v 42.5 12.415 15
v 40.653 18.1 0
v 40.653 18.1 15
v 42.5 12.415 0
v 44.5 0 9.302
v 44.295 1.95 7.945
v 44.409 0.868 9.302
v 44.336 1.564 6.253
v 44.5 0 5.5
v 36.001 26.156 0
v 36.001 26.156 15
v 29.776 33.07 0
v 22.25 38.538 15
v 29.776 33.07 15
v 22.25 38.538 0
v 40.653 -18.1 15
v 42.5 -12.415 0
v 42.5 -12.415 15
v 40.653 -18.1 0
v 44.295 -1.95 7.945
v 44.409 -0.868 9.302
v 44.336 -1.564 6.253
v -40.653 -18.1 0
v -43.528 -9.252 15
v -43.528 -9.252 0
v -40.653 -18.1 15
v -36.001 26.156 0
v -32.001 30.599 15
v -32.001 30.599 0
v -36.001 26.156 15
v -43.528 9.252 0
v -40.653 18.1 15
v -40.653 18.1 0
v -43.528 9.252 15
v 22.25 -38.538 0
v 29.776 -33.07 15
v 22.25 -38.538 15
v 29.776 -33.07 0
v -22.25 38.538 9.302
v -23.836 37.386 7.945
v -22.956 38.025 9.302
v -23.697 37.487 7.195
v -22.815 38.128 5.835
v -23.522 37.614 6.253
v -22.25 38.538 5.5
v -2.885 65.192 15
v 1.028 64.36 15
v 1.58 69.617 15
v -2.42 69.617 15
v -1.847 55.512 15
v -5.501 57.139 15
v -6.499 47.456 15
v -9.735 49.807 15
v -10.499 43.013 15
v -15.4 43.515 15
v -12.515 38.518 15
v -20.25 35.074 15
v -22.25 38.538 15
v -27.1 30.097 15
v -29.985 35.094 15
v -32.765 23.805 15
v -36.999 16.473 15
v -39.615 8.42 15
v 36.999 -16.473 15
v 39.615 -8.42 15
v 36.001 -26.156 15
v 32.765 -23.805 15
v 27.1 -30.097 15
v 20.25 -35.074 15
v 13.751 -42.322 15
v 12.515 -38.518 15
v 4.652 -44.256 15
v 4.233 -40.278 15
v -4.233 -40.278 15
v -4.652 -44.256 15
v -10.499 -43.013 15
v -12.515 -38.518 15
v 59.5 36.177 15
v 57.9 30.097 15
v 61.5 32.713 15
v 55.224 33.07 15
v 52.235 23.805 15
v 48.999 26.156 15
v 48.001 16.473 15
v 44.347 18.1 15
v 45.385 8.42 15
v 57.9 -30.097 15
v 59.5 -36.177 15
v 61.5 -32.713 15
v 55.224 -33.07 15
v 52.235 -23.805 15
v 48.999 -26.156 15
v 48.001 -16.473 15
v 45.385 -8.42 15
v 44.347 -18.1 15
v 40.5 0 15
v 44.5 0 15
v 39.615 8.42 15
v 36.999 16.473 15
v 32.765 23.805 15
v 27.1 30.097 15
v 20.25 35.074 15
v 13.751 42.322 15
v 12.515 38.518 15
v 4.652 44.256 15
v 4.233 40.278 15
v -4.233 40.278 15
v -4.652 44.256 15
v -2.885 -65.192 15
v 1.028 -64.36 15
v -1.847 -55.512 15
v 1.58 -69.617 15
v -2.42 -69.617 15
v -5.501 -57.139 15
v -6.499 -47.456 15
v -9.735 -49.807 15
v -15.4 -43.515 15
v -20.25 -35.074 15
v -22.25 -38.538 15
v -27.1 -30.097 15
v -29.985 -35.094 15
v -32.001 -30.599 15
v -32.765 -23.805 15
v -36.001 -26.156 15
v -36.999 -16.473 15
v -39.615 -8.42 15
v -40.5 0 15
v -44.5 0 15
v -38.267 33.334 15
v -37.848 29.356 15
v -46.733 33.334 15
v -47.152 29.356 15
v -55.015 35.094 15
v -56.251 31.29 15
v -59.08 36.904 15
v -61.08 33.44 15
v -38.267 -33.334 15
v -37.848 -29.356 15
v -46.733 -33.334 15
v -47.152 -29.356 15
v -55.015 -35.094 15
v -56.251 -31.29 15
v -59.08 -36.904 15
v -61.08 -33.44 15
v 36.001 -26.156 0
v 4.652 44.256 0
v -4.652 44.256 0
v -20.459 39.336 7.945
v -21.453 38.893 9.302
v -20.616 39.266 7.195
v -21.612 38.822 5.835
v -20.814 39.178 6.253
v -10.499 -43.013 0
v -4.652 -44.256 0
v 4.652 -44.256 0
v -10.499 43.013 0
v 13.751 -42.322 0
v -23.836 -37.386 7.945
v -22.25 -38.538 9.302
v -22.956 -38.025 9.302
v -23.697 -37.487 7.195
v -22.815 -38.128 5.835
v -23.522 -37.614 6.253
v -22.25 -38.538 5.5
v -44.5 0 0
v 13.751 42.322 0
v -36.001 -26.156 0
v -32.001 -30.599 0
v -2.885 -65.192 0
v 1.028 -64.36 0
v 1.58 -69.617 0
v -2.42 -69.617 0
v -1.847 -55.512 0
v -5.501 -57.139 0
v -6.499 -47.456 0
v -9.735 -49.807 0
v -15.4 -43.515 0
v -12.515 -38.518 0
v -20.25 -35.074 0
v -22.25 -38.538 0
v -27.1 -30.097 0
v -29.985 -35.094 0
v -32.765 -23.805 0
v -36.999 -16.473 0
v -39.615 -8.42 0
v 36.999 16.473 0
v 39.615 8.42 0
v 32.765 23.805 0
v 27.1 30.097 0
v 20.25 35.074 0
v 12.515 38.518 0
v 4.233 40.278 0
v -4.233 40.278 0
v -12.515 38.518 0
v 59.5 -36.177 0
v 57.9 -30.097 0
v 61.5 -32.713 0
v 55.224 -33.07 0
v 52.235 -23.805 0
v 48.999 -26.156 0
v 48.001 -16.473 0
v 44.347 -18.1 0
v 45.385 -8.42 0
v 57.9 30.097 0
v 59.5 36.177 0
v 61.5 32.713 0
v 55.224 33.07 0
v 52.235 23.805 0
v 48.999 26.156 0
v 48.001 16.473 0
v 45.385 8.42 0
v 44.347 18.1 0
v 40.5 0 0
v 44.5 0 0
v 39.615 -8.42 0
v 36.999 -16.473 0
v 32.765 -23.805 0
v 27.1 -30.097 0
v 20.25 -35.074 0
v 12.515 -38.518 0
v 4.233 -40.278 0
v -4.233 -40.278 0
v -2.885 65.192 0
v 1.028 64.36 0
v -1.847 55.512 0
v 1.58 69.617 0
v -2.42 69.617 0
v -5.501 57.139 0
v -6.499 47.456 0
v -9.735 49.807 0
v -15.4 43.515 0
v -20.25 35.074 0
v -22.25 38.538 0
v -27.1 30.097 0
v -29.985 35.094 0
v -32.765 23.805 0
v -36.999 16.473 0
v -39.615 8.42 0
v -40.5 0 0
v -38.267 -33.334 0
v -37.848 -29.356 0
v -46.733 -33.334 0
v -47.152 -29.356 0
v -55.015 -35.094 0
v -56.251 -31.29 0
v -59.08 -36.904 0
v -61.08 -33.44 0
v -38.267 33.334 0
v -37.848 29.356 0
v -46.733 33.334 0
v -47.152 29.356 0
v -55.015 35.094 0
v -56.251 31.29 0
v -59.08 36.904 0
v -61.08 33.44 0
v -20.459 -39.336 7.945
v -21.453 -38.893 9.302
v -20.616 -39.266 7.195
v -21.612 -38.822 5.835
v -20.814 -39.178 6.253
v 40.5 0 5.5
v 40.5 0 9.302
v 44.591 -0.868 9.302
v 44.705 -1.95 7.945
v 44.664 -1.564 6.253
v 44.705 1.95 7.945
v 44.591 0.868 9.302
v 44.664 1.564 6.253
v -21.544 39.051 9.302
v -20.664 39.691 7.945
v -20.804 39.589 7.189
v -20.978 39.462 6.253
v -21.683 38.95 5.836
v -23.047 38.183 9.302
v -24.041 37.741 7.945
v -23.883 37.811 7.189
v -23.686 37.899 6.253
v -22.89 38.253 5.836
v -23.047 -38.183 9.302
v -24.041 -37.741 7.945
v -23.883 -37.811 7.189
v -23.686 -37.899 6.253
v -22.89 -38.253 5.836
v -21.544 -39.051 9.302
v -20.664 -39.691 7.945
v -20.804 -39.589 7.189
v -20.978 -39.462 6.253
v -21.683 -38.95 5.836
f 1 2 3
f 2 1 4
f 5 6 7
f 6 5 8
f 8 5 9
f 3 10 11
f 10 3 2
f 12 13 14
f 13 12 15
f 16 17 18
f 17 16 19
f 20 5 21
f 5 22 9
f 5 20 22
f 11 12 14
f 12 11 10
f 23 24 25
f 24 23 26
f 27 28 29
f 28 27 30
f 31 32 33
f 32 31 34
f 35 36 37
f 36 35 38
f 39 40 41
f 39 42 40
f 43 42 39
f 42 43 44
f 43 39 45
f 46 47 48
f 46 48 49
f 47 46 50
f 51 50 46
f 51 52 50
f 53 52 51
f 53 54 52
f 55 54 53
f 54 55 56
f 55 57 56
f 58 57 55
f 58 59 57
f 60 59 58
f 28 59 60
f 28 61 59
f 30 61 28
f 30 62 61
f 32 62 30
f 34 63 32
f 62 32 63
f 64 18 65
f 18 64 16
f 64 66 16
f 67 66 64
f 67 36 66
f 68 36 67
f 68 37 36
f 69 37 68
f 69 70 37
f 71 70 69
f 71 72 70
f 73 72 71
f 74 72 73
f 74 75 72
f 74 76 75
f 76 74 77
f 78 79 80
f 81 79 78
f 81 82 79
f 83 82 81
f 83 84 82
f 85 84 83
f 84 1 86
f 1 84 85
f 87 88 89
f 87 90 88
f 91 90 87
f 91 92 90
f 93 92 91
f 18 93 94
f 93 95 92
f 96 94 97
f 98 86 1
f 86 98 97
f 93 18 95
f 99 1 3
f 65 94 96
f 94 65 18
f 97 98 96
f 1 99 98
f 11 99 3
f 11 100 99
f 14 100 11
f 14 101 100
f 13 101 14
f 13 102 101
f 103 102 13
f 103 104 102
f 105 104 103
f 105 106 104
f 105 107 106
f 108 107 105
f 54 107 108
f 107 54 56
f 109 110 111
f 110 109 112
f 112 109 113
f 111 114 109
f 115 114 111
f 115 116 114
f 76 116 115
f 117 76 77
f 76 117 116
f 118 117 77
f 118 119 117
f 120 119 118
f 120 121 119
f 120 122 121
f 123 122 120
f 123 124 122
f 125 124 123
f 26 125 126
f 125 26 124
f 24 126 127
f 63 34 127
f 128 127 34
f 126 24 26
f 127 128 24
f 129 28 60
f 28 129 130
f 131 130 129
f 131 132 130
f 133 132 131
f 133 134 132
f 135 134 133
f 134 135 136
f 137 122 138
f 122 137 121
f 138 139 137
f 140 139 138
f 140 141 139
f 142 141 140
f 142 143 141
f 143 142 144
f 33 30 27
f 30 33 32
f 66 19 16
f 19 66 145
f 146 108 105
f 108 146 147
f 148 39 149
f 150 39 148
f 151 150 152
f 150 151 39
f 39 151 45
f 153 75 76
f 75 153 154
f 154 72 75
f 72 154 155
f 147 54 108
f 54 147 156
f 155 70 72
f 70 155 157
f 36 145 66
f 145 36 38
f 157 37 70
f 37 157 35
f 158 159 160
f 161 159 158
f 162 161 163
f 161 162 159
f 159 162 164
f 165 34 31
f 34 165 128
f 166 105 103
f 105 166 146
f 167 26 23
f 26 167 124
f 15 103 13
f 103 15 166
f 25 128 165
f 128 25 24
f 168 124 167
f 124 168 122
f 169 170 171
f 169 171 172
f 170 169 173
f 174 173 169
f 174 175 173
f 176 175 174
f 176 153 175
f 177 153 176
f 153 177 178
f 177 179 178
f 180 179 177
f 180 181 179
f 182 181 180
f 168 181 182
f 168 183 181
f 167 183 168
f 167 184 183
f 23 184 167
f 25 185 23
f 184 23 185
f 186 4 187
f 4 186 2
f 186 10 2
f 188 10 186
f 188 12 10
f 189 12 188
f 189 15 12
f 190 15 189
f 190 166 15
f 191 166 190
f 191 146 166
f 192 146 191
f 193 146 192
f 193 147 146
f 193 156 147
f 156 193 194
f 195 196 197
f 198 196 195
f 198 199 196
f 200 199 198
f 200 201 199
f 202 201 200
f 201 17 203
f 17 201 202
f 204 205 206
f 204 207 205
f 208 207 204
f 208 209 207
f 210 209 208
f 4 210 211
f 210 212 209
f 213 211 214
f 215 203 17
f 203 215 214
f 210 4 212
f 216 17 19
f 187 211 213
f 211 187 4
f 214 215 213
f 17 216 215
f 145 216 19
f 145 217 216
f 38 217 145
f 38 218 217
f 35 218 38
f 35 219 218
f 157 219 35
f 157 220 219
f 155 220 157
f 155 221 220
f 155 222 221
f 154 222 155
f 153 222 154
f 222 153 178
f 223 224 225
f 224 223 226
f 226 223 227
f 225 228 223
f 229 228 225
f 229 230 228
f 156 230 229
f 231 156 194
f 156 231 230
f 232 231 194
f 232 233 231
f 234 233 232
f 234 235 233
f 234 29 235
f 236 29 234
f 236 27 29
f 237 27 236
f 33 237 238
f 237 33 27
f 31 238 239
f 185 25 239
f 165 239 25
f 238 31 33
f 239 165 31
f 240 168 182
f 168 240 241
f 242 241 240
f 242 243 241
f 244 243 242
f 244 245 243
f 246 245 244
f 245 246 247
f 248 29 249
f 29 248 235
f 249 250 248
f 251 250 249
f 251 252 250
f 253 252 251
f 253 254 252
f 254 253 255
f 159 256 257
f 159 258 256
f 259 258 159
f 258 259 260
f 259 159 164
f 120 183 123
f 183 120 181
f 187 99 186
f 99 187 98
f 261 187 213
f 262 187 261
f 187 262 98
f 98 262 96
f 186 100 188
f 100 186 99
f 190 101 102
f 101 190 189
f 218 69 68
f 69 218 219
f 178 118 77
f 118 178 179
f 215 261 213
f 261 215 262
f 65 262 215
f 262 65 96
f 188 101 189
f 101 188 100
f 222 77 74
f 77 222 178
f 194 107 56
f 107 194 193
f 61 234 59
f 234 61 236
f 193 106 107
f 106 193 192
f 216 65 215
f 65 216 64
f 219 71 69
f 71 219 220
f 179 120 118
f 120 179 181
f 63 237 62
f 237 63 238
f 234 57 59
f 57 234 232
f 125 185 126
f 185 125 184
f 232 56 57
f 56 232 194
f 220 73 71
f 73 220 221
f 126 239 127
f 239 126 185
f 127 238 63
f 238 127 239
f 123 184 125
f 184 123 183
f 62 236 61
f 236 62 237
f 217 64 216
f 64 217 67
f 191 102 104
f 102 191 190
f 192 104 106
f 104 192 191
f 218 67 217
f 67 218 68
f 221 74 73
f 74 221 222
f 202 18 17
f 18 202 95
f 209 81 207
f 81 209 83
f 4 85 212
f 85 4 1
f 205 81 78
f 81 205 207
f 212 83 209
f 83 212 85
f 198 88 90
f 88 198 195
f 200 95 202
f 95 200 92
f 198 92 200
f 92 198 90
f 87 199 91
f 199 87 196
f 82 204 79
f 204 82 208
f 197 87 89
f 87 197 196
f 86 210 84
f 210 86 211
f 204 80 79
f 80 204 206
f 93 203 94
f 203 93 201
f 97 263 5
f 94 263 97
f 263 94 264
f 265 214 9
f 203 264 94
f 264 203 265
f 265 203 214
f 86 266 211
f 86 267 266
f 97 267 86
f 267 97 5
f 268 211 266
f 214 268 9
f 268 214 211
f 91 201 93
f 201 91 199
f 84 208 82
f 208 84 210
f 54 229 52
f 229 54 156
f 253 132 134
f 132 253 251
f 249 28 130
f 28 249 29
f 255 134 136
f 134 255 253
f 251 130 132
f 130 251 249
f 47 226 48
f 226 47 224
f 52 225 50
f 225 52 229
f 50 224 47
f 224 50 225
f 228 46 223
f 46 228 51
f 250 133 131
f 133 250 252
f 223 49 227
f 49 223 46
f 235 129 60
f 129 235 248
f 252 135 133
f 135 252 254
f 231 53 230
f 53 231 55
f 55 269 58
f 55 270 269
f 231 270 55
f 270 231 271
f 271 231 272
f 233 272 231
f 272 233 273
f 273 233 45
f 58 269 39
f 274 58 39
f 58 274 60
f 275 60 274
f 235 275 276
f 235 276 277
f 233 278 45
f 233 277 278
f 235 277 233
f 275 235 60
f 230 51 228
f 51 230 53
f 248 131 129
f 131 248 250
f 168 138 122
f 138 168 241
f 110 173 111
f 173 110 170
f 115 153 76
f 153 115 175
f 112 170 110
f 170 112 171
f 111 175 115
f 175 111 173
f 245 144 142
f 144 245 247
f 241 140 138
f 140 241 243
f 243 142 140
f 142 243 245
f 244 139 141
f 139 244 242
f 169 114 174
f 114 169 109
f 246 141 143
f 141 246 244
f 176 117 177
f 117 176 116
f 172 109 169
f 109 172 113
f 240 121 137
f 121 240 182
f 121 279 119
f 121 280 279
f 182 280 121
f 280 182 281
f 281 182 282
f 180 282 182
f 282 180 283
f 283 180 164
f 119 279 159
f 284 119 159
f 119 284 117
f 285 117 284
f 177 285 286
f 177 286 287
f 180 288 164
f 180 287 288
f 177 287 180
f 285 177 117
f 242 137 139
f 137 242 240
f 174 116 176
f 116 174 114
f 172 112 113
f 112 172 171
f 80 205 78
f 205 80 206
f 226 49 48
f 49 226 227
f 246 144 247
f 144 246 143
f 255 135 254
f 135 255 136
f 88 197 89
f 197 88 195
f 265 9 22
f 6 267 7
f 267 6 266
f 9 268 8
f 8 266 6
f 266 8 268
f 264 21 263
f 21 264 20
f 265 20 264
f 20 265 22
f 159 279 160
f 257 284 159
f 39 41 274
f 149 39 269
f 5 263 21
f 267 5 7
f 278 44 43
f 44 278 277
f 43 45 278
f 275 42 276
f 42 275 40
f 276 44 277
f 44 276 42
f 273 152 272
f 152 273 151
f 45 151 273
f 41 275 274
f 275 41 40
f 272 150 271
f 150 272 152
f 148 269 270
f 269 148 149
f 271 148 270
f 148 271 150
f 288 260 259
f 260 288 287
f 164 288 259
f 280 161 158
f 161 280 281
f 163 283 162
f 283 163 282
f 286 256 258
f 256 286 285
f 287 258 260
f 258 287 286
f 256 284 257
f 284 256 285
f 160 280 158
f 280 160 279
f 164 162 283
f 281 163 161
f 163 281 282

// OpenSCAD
ring_diameter = 89;
ring_thickness = 4;
ring_height = 15;

module ring(diameter, thickness, height) {
  outer_radius = diameter / 2;
  inner_radius = outer_radius - thickness;
  difference() {
    // outer cylinder
    cylinder(height, outer_radius, outer_radius, false);
    // inner cylinder, which gets subtracted from the outer in order to
    // make a ring
    translate([0,0,-1]) {
      cylinder(17, inner_radius, inner_radius, false);
    };
  };
};

module offset_ring(diameter, thickness, height) {
  translate([diameter - thickness, 0, 0]) {
    ring(diameter, thickness, height);
  };
}

module screw_hole() {
  // one cylinder emanating from the z-axis that will be subtracted
  // from a ring to create a hole for a nut and bolt
  translate([0,0, ring_height/2]) {
    rotate([0,90,0]) {
      cylinder(100, 2, 2, false);
    };
  };
};

module basic_inner_hub() {
  // center ring
  ring(ring_diameter, ring_thickness, ring_height);

  difference() {
    intersection() {

      union() {
        // three rings around the outside of the center ring
        offset_ring(ring_diameter, ring_thickness, ring_height);
        rotate([0,0,120]) {
          offset_ring(ring_diameter, ring_thickness, ring_height);
        };
        rotate([0,0,240]) {
          offset_ring(ring_diameter, ring_thickness, ring_height);
        };
      };

      // bounding cylinder to cut off everything but the innermost
      // arcs of the rings around the outside
      cylinder(20, 70, 70, false);
    };

    // screw holes
    union() {
      screw_hole();
      rotate([0,0,120]) {
        screw_hole();
      };
      rotate([0,0,240]) {
        screw_hole();
      };
    };
  };
};

basic_inner_hub();
